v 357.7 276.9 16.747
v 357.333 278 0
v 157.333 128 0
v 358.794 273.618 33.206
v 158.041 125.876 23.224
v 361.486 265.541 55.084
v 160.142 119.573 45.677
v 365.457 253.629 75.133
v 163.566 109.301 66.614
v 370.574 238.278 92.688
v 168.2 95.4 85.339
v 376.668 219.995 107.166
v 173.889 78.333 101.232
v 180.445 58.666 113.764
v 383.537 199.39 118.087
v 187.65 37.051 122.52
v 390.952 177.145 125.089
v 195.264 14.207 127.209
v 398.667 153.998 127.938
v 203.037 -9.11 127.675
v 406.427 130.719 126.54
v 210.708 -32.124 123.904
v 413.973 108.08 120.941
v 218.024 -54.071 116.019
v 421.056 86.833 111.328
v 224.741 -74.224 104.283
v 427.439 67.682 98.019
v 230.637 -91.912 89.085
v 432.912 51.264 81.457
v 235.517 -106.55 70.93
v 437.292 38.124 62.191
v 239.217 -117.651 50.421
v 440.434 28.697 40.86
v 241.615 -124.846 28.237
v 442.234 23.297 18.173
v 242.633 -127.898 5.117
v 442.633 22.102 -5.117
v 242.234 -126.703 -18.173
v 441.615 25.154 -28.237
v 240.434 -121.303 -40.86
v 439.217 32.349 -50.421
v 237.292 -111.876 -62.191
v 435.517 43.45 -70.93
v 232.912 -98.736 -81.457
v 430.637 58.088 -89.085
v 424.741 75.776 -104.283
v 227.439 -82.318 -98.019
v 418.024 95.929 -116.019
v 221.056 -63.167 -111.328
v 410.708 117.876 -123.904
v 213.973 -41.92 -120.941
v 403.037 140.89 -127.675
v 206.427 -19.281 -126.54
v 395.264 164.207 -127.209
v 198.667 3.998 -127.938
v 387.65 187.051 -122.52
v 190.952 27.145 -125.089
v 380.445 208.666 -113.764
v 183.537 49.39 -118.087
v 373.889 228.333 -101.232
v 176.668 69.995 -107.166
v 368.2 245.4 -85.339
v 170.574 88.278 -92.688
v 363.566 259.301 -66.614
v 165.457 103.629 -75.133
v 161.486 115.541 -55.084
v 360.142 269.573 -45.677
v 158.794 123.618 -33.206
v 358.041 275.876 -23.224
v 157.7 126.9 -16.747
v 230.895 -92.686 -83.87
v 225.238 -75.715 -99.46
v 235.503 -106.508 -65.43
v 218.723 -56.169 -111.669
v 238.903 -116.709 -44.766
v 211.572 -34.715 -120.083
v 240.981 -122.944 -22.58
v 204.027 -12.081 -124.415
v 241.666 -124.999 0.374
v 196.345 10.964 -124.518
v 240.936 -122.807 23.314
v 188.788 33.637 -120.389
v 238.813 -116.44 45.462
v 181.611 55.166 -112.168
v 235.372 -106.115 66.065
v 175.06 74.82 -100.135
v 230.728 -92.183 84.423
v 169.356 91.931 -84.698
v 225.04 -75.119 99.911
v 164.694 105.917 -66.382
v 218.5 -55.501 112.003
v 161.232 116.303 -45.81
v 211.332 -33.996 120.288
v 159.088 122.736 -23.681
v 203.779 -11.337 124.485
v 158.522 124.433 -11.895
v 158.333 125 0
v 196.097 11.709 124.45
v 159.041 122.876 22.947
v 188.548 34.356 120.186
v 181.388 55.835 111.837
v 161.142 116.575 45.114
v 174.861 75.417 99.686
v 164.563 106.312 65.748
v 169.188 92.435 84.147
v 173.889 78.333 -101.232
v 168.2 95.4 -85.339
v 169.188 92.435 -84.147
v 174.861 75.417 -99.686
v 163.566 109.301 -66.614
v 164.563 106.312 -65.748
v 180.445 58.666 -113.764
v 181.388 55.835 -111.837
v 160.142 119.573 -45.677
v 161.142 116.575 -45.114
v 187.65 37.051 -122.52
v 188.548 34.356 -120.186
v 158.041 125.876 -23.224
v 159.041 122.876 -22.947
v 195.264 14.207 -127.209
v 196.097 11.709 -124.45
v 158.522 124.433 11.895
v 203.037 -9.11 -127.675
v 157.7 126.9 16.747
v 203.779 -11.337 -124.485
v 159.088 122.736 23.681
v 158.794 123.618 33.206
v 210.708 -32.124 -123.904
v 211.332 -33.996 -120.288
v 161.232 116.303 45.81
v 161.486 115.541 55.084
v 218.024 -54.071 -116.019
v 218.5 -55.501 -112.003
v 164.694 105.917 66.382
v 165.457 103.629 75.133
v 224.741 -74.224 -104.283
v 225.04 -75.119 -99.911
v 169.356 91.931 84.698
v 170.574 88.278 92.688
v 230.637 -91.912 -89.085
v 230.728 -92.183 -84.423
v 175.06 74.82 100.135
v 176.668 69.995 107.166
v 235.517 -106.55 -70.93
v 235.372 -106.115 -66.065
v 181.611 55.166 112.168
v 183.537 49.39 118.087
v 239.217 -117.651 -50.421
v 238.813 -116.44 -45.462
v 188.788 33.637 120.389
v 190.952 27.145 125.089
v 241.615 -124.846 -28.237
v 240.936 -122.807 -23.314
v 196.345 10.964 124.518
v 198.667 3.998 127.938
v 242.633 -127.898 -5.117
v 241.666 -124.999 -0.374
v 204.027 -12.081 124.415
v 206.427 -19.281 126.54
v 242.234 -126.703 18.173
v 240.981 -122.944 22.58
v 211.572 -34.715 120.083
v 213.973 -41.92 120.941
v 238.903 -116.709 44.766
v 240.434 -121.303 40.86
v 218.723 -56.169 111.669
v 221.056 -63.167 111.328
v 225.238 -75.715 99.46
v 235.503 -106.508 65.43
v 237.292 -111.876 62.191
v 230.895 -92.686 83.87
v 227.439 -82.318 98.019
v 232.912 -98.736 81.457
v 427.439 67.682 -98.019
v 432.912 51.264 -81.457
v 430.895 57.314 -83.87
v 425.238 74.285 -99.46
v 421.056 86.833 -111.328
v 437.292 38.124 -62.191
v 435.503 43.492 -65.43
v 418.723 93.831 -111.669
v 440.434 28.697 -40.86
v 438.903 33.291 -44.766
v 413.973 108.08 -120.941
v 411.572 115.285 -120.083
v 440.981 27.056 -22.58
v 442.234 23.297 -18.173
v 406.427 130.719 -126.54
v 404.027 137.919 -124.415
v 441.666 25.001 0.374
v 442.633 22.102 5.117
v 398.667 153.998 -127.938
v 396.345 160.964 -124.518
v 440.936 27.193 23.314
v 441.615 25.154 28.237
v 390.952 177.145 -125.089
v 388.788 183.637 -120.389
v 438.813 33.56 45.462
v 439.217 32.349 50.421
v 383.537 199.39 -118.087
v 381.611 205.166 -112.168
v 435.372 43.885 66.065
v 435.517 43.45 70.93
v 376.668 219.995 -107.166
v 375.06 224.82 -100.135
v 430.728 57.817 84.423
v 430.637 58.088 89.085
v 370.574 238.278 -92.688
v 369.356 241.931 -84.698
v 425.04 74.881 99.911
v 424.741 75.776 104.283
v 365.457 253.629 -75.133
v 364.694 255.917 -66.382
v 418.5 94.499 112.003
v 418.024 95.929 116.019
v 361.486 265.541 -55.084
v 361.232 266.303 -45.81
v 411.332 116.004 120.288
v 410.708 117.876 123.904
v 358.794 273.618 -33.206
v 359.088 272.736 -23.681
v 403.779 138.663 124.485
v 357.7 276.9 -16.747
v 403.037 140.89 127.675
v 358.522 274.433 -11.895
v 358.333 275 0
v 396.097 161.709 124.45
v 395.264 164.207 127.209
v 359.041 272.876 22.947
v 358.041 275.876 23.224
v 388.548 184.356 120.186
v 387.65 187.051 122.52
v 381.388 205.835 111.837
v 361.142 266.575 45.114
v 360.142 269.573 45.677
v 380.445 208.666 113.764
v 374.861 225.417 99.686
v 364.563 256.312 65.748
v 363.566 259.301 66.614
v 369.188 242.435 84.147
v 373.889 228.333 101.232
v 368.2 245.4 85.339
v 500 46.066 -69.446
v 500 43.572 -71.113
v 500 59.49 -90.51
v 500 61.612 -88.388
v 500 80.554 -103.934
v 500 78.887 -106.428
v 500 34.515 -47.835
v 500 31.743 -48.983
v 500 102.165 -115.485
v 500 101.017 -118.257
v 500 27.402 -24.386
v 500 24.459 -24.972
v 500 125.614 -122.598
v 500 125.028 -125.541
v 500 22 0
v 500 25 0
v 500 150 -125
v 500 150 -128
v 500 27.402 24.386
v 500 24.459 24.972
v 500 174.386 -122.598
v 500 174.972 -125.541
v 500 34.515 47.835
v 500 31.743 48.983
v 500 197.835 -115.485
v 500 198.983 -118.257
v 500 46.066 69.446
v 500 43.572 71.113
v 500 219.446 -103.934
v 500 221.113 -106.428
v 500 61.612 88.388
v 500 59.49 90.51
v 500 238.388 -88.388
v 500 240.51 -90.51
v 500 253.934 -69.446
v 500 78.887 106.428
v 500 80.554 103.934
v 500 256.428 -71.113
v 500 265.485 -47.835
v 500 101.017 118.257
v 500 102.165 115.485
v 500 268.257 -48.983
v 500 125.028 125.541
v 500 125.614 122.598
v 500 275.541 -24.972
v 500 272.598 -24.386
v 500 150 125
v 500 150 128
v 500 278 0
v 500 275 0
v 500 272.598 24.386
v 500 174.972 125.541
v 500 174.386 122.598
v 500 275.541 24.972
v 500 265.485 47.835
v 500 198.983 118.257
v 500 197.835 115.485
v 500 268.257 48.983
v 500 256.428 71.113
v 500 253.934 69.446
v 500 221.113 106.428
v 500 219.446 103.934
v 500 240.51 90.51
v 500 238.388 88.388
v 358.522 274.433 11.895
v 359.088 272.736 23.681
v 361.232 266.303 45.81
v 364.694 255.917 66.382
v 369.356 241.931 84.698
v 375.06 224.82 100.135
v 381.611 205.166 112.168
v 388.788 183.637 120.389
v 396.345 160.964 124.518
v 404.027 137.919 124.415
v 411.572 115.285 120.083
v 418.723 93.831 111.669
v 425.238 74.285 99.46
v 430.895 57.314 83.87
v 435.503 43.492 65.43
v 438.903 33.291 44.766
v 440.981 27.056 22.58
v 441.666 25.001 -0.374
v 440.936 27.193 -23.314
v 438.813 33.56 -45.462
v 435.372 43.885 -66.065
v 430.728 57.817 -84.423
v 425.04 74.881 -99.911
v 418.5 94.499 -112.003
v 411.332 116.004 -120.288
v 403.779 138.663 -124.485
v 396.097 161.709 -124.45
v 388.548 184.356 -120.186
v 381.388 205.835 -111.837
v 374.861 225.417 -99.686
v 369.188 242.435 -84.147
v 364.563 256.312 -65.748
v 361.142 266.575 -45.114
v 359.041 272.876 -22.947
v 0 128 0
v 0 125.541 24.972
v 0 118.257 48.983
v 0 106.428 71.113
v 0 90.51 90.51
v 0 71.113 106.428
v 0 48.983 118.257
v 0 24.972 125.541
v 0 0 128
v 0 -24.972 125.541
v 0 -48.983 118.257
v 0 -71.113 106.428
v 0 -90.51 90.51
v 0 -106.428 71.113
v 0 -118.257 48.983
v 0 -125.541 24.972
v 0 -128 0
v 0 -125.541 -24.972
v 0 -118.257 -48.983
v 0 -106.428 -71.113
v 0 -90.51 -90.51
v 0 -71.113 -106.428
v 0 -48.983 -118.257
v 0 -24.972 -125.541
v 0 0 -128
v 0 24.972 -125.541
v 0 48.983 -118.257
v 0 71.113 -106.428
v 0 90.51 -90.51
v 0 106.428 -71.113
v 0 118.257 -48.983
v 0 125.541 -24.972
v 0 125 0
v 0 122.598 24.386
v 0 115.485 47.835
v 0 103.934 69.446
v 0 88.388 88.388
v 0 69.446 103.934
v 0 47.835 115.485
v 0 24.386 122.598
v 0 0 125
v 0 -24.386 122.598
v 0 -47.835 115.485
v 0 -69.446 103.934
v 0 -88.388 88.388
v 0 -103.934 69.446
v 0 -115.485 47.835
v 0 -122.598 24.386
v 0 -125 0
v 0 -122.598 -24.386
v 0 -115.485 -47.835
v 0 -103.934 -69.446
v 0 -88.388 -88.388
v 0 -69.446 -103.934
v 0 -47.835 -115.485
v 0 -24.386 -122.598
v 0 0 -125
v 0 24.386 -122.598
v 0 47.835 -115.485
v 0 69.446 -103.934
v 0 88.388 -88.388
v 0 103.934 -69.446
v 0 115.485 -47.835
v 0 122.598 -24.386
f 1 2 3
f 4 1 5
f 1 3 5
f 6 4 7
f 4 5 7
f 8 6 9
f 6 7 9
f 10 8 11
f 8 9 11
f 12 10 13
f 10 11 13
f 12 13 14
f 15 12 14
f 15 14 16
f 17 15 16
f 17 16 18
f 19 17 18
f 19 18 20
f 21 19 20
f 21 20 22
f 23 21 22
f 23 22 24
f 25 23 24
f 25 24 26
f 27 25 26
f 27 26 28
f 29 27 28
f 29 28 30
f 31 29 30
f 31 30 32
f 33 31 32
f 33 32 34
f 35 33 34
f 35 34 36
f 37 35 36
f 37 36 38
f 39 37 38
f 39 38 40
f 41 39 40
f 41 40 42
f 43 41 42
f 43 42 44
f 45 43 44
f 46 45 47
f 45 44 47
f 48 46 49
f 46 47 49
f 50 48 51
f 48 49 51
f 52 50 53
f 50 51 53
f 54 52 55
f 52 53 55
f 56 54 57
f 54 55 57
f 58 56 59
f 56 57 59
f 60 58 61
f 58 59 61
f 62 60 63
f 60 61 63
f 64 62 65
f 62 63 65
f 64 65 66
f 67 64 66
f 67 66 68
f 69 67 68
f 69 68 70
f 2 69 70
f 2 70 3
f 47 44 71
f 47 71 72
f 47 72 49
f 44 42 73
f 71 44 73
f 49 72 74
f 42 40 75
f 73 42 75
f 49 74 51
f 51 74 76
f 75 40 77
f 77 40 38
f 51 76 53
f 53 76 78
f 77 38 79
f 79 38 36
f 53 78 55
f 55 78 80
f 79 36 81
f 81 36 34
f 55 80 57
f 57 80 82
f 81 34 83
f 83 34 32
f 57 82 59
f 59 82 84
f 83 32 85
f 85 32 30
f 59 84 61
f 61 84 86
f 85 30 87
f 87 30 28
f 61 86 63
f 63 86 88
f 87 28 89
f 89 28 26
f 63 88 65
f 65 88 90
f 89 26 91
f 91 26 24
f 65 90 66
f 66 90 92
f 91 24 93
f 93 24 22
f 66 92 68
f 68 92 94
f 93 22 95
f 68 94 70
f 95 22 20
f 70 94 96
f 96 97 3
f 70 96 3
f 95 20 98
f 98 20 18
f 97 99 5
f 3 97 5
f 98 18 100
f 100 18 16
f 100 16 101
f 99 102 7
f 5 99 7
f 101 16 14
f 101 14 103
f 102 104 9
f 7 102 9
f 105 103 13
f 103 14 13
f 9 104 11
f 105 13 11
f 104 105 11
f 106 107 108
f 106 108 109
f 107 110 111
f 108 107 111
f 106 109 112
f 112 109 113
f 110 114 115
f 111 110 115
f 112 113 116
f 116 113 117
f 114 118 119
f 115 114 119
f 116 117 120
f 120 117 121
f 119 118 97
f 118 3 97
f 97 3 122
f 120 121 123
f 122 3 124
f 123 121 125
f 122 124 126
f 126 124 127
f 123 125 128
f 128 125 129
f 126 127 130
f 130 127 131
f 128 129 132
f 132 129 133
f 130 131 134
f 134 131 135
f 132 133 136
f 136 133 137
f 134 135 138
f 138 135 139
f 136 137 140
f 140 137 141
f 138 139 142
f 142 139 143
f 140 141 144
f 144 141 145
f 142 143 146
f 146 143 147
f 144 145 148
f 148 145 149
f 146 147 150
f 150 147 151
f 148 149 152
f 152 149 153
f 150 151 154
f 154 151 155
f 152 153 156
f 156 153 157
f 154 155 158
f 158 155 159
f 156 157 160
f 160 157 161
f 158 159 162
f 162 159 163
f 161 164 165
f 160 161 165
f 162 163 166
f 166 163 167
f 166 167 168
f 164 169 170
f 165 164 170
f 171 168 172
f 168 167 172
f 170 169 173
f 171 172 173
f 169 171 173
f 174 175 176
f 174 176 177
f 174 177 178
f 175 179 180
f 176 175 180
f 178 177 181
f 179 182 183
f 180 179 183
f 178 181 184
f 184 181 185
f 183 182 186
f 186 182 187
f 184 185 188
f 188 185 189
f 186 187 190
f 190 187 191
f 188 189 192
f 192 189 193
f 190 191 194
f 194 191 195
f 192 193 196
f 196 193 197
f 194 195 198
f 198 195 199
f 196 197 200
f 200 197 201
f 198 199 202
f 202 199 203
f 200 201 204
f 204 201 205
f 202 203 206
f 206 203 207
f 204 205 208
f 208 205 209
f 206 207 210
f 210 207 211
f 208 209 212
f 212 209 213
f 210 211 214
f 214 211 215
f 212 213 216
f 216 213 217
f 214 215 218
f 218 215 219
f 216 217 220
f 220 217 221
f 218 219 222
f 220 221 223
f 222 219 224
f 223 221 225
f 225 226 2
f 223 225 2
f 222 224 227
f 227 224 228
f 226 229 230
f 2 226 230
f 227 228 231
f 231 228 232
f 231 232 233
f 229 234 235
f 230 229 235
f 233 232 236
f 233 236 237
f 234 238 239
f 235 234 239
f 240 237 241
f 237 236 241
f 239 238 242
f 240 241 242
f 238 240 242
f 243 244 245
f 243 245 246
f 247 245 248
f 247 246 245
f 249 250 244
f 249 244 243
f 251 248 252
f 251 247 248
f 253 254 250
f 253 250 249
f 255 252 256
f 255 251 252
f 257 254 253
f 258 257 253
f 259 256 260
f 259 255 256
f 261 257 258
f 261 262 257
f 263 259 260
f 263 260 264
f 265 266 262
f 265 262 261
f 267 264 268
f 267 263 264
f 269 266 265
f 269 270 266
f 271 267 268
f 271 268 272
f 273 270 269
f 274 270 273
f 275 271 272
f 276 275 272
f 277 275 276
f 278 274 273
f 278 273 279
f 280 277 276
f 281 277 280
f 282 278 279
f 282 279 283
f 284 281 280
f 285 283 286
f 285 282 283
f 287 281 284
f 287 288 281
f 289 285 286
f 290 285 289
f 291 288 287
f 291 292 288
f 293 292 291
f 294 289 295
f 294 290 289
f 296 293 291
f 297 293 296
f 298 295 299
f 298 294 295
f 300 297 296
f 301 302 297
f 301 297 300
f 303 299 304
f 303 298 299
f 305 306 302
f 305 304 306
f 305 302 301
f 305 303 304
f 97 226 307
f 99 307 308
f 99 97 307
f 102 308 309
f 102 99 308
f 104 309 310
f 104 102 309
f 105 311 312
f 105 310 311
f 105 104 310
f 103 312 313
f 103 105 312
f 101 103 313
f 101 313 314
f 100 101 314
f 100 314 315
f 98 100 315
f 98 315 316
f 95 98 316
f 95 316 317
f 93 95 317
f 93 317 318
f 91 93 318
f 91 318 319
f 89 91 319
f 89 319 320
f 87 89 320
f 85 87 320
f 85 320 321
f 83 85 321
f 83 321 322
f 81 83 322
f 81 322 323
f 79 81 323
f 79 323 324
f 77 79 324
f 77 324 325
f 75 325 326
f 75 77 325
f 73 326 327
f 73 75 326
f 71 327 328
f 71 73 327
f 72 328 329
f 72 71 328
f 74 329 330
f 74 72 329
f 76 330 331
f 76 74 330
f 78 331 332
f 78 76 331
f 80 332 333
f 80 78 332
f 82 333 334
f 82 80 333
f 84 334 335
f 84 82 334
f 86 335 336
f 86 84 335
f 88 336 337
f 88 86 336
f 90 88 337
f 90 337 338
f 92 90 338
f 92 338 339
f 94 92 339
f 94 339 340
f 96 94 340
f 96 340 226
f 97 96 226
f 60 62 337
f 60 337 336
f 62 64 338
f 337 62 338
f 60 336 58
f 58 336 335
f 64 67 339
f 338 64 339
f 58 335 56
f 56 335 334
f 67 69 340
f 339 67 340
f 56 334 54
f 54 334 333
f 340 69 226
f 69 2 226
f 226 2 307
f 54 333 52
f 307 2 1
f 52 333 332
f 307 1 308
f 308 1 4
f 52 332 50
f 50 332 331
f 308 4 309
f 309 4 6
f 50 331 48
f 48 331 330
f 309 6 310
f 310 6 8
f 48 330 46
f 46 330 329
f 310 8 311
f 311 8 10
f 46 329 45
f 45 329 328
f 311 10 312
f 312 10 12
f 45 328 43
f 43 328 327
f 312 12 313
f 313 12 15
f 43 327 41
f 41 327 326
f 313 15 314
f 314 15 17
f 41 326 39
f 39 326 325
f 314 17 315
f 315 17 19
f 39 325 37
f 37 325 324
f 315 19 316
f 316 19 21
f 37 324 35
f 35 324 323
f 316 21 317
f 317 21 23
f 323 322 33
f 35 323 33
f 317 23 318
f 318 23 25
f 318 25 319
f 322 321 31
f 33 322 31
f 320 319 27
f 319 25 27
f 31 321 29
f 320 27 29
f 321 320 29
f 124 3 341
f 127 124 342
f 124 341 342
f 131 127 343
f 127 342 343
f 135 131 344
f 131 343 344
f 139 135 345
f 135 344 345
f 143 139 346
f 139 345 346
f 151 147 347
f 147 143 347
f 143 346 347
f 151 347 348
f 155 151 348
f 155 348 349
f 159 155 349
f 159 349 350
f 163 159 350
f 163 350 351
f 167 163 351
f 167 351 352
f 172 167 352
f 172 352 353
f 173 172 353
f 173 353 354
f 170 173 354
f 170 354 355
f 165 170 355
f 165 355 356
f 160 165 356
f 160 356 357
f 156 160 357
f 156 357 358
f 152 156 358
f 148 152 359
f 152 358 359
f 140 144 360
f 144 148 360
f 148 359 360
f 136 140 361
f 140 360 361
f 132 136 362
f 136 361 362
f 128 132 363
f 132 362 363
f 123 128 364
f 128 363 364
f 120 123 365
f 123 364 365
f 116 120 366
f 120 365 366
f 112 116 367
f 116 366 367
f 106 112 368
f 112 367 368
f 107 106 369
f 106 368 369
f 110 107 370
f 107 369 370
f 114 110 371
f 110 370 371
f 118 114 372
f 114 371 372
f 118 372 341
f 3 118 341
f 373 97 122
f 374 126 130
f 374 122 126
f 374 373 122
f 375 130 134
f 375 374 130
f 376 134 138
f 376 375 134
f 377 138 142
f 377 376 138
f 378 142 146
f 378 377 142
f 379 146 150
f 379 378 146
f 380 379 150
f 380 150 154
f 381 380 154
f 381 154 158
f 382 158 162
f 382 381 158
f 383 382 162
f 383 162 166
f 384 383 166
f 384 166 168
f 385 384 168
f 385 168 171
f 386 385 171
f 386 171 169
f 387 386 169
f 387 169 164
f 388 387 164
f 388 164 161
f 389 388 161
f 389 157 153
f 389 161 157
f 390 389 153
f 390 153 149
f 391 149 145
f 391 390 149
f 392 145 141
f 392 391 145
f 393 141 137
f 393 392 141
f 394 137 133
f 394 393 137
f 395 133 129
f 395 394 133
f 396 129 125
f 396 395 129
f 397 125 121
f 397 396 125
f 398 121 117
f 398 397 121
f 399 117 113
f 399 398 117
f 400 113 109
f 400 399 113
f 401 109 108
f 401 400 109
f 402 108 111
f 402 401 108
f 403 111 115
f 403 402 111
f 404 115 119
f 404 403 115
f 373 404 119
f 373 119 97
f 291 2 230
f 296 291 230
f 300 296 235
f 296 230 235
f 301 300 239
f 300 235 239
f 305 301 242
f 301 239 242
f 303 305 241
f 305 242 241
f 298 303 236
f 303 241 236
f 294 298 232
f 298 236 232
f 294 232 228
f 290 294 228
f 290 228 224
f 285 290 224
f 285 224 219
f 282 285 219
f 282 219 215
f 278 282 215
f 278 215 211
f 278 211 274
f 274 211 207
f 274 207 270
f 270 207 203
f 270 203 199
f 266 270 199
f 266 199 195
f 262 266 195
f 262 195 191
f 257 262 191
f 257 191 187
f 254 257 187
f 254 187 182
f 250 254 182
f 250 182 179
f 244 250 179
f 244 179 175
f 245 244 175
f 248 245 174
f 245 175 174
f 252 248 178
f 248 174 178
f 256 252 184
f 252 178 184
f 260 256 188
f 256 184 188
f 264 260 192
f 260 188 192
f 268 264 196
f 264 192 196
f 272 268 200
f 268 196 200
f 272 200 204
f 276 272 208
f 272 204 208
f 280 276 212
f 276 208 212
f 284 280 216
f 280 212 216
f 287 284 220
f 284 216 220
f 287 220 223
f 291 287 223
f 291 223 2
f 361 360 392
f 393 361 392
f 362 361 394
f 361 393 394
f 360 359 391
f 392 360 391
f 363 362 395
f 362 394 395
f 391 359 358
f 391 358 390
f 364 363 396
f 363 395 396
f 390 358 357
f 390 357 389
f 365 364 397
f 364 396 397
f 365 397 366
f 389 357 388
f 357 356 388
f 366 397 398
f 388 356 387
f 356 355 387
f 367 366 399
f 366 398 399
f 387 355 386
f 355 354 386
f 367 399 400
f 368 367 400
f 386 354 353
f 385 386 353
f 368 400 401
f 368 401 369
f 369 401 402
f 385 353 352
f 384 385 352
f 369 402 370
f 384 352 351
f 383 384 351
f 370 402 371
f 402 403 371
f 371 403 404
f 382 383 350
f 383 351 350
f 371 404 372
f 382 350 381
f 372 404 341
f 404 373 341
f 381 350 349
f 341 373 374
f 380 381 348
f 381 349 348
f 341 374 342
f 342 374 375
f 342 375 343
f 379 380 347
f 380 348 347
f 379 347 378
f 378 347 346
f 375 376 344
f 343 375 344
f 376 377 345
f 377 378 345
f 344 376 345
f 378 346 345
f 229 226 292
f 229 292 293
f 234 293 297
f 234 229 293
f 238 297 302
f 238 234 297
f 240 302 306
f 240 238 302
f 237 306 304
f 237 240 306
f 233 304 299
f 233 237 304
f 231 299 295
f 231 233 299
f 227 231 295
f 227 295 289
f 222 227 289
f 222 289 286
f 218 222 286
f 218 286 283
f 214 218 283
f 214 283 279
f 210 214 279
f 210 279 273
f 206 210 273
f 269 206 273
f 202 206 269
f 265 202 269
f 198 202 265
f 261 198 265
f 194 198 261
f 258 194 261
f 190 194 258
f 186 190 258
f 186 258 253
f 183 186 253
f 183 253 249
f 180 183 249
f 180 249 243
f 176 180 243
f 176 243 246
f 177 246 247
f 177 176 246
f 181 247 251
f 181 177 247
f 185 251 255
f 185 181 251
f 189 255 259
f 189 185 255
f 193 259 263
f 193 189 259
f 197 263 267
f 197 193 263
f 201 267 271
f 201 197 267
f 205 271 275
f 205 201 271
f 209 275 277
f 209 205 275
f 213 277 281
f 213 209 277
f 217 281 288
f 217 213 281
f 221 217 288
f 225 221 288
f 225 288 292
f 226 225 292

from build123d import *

# Parameters (mm, degrees)
SKETCH1_R                = 128
SKETCH1_R_2              = 125
STRUKTURBAUTEIL1_DEPTH   = 261.339778661
SKETCH1_ON_SEGMENT_2_R   = 128
SKETCH1_ON_SEGMENT_2_R_2 = 125
STRUKTURBAUTEIL1_2_DEPTH = 372.679557323
SKETCH1_ON_SEGMENT_3_R   = 128
SKETCH1_ON_SEGMENT_3_R_2 = 125
STRUKTURBAUTEIL1_3_DEPTH = 161.339778661


with BuildPart() as part:
    # Sketch1 → Strukturbauteil1 (new body)
    with BuildSketch(Plane.YZ):
        Circle(SKETCH1_R)
        Circle(SKETCH1_R_2, mode=Mode.SUBTRACT)
    extrude(amount=STRUKTURBAUTEIL1_DEPTH)

    # Strukturbauteil1 mitre 1
    split(bisect_by=Plane(origin=(200, 0, 0), x_dir=(0.316227766, -0.948683298, 0), z_dir=(-0.948683298, -0.316227766, 0)), keep=Keep.TOP)


with BuildPart() as body_2:
    # Sketch1 on segment 2 (carried to segment 2) → Strukturbauteil1 2 (new body)
    with BuildSketch(Plane(origin=(150.928177071, -36.803867197, 0), x_dir=(-0.6, 0.8, 0), z_dir=(0.8, 0.6, 0))):
        Circle(SKETCH1_ON_SEGMENT_2_R)
        Circle(SKETCH1_ON_SEGMENT_2_R_2, mode=Mode.SUBTRACT)
    extrude(amount=STRUKTURBAUTEIL1_2_DEPTH)

    # Strukturbauteil1 2 mitre 1
    split(bisect_by=Plane(origin=(200, 0, 0), x_dir=(-0.316227766, 0.948683298, 0), z_dir=(0.948683298, 0.316227766, 0)), keep=Keep.TOP)

    # Strukturbauteil1 2 mitre 2
    split(bisect_by=Plane(origin=(400, 150, 0), x_dir=(0.316227766, -0.948683298, 0), z_dir=(-0.948683298, -0.316227766, 0)), keep=Keep.TOP)


with BuildPart() as body_3:
    # Sketch1 on segment 3 (carried to segment 3) → Strukturbauteil1 3 (new body)
    with BuildSketch(Plane(origin=(338.660221339, 150, 0), x_dir=(0, 1, 0), z_dir=(1, 0, 0))):
        Circle(SKETCH1_ON_SEGMENT_3_R)
        Circle(SKETCH1_ON_SEGMENT_3_R_2, mode=Mode.SUBTRACT)
    extrude(amount=STRUKTURBAUTEIL1_3_DEPTH)

    # Strukturbauteil1 3 mitre 1
    split(bisect_by=Plane(origin=(400, 150, 0), x_dir=(-0.316227766, 0.948683298, 0), z_dir=(0.948683298, 0.316227766, 0)), keep=Keep.TOP)


solid = Compound([part.part, body_2.part, body_3.part])
